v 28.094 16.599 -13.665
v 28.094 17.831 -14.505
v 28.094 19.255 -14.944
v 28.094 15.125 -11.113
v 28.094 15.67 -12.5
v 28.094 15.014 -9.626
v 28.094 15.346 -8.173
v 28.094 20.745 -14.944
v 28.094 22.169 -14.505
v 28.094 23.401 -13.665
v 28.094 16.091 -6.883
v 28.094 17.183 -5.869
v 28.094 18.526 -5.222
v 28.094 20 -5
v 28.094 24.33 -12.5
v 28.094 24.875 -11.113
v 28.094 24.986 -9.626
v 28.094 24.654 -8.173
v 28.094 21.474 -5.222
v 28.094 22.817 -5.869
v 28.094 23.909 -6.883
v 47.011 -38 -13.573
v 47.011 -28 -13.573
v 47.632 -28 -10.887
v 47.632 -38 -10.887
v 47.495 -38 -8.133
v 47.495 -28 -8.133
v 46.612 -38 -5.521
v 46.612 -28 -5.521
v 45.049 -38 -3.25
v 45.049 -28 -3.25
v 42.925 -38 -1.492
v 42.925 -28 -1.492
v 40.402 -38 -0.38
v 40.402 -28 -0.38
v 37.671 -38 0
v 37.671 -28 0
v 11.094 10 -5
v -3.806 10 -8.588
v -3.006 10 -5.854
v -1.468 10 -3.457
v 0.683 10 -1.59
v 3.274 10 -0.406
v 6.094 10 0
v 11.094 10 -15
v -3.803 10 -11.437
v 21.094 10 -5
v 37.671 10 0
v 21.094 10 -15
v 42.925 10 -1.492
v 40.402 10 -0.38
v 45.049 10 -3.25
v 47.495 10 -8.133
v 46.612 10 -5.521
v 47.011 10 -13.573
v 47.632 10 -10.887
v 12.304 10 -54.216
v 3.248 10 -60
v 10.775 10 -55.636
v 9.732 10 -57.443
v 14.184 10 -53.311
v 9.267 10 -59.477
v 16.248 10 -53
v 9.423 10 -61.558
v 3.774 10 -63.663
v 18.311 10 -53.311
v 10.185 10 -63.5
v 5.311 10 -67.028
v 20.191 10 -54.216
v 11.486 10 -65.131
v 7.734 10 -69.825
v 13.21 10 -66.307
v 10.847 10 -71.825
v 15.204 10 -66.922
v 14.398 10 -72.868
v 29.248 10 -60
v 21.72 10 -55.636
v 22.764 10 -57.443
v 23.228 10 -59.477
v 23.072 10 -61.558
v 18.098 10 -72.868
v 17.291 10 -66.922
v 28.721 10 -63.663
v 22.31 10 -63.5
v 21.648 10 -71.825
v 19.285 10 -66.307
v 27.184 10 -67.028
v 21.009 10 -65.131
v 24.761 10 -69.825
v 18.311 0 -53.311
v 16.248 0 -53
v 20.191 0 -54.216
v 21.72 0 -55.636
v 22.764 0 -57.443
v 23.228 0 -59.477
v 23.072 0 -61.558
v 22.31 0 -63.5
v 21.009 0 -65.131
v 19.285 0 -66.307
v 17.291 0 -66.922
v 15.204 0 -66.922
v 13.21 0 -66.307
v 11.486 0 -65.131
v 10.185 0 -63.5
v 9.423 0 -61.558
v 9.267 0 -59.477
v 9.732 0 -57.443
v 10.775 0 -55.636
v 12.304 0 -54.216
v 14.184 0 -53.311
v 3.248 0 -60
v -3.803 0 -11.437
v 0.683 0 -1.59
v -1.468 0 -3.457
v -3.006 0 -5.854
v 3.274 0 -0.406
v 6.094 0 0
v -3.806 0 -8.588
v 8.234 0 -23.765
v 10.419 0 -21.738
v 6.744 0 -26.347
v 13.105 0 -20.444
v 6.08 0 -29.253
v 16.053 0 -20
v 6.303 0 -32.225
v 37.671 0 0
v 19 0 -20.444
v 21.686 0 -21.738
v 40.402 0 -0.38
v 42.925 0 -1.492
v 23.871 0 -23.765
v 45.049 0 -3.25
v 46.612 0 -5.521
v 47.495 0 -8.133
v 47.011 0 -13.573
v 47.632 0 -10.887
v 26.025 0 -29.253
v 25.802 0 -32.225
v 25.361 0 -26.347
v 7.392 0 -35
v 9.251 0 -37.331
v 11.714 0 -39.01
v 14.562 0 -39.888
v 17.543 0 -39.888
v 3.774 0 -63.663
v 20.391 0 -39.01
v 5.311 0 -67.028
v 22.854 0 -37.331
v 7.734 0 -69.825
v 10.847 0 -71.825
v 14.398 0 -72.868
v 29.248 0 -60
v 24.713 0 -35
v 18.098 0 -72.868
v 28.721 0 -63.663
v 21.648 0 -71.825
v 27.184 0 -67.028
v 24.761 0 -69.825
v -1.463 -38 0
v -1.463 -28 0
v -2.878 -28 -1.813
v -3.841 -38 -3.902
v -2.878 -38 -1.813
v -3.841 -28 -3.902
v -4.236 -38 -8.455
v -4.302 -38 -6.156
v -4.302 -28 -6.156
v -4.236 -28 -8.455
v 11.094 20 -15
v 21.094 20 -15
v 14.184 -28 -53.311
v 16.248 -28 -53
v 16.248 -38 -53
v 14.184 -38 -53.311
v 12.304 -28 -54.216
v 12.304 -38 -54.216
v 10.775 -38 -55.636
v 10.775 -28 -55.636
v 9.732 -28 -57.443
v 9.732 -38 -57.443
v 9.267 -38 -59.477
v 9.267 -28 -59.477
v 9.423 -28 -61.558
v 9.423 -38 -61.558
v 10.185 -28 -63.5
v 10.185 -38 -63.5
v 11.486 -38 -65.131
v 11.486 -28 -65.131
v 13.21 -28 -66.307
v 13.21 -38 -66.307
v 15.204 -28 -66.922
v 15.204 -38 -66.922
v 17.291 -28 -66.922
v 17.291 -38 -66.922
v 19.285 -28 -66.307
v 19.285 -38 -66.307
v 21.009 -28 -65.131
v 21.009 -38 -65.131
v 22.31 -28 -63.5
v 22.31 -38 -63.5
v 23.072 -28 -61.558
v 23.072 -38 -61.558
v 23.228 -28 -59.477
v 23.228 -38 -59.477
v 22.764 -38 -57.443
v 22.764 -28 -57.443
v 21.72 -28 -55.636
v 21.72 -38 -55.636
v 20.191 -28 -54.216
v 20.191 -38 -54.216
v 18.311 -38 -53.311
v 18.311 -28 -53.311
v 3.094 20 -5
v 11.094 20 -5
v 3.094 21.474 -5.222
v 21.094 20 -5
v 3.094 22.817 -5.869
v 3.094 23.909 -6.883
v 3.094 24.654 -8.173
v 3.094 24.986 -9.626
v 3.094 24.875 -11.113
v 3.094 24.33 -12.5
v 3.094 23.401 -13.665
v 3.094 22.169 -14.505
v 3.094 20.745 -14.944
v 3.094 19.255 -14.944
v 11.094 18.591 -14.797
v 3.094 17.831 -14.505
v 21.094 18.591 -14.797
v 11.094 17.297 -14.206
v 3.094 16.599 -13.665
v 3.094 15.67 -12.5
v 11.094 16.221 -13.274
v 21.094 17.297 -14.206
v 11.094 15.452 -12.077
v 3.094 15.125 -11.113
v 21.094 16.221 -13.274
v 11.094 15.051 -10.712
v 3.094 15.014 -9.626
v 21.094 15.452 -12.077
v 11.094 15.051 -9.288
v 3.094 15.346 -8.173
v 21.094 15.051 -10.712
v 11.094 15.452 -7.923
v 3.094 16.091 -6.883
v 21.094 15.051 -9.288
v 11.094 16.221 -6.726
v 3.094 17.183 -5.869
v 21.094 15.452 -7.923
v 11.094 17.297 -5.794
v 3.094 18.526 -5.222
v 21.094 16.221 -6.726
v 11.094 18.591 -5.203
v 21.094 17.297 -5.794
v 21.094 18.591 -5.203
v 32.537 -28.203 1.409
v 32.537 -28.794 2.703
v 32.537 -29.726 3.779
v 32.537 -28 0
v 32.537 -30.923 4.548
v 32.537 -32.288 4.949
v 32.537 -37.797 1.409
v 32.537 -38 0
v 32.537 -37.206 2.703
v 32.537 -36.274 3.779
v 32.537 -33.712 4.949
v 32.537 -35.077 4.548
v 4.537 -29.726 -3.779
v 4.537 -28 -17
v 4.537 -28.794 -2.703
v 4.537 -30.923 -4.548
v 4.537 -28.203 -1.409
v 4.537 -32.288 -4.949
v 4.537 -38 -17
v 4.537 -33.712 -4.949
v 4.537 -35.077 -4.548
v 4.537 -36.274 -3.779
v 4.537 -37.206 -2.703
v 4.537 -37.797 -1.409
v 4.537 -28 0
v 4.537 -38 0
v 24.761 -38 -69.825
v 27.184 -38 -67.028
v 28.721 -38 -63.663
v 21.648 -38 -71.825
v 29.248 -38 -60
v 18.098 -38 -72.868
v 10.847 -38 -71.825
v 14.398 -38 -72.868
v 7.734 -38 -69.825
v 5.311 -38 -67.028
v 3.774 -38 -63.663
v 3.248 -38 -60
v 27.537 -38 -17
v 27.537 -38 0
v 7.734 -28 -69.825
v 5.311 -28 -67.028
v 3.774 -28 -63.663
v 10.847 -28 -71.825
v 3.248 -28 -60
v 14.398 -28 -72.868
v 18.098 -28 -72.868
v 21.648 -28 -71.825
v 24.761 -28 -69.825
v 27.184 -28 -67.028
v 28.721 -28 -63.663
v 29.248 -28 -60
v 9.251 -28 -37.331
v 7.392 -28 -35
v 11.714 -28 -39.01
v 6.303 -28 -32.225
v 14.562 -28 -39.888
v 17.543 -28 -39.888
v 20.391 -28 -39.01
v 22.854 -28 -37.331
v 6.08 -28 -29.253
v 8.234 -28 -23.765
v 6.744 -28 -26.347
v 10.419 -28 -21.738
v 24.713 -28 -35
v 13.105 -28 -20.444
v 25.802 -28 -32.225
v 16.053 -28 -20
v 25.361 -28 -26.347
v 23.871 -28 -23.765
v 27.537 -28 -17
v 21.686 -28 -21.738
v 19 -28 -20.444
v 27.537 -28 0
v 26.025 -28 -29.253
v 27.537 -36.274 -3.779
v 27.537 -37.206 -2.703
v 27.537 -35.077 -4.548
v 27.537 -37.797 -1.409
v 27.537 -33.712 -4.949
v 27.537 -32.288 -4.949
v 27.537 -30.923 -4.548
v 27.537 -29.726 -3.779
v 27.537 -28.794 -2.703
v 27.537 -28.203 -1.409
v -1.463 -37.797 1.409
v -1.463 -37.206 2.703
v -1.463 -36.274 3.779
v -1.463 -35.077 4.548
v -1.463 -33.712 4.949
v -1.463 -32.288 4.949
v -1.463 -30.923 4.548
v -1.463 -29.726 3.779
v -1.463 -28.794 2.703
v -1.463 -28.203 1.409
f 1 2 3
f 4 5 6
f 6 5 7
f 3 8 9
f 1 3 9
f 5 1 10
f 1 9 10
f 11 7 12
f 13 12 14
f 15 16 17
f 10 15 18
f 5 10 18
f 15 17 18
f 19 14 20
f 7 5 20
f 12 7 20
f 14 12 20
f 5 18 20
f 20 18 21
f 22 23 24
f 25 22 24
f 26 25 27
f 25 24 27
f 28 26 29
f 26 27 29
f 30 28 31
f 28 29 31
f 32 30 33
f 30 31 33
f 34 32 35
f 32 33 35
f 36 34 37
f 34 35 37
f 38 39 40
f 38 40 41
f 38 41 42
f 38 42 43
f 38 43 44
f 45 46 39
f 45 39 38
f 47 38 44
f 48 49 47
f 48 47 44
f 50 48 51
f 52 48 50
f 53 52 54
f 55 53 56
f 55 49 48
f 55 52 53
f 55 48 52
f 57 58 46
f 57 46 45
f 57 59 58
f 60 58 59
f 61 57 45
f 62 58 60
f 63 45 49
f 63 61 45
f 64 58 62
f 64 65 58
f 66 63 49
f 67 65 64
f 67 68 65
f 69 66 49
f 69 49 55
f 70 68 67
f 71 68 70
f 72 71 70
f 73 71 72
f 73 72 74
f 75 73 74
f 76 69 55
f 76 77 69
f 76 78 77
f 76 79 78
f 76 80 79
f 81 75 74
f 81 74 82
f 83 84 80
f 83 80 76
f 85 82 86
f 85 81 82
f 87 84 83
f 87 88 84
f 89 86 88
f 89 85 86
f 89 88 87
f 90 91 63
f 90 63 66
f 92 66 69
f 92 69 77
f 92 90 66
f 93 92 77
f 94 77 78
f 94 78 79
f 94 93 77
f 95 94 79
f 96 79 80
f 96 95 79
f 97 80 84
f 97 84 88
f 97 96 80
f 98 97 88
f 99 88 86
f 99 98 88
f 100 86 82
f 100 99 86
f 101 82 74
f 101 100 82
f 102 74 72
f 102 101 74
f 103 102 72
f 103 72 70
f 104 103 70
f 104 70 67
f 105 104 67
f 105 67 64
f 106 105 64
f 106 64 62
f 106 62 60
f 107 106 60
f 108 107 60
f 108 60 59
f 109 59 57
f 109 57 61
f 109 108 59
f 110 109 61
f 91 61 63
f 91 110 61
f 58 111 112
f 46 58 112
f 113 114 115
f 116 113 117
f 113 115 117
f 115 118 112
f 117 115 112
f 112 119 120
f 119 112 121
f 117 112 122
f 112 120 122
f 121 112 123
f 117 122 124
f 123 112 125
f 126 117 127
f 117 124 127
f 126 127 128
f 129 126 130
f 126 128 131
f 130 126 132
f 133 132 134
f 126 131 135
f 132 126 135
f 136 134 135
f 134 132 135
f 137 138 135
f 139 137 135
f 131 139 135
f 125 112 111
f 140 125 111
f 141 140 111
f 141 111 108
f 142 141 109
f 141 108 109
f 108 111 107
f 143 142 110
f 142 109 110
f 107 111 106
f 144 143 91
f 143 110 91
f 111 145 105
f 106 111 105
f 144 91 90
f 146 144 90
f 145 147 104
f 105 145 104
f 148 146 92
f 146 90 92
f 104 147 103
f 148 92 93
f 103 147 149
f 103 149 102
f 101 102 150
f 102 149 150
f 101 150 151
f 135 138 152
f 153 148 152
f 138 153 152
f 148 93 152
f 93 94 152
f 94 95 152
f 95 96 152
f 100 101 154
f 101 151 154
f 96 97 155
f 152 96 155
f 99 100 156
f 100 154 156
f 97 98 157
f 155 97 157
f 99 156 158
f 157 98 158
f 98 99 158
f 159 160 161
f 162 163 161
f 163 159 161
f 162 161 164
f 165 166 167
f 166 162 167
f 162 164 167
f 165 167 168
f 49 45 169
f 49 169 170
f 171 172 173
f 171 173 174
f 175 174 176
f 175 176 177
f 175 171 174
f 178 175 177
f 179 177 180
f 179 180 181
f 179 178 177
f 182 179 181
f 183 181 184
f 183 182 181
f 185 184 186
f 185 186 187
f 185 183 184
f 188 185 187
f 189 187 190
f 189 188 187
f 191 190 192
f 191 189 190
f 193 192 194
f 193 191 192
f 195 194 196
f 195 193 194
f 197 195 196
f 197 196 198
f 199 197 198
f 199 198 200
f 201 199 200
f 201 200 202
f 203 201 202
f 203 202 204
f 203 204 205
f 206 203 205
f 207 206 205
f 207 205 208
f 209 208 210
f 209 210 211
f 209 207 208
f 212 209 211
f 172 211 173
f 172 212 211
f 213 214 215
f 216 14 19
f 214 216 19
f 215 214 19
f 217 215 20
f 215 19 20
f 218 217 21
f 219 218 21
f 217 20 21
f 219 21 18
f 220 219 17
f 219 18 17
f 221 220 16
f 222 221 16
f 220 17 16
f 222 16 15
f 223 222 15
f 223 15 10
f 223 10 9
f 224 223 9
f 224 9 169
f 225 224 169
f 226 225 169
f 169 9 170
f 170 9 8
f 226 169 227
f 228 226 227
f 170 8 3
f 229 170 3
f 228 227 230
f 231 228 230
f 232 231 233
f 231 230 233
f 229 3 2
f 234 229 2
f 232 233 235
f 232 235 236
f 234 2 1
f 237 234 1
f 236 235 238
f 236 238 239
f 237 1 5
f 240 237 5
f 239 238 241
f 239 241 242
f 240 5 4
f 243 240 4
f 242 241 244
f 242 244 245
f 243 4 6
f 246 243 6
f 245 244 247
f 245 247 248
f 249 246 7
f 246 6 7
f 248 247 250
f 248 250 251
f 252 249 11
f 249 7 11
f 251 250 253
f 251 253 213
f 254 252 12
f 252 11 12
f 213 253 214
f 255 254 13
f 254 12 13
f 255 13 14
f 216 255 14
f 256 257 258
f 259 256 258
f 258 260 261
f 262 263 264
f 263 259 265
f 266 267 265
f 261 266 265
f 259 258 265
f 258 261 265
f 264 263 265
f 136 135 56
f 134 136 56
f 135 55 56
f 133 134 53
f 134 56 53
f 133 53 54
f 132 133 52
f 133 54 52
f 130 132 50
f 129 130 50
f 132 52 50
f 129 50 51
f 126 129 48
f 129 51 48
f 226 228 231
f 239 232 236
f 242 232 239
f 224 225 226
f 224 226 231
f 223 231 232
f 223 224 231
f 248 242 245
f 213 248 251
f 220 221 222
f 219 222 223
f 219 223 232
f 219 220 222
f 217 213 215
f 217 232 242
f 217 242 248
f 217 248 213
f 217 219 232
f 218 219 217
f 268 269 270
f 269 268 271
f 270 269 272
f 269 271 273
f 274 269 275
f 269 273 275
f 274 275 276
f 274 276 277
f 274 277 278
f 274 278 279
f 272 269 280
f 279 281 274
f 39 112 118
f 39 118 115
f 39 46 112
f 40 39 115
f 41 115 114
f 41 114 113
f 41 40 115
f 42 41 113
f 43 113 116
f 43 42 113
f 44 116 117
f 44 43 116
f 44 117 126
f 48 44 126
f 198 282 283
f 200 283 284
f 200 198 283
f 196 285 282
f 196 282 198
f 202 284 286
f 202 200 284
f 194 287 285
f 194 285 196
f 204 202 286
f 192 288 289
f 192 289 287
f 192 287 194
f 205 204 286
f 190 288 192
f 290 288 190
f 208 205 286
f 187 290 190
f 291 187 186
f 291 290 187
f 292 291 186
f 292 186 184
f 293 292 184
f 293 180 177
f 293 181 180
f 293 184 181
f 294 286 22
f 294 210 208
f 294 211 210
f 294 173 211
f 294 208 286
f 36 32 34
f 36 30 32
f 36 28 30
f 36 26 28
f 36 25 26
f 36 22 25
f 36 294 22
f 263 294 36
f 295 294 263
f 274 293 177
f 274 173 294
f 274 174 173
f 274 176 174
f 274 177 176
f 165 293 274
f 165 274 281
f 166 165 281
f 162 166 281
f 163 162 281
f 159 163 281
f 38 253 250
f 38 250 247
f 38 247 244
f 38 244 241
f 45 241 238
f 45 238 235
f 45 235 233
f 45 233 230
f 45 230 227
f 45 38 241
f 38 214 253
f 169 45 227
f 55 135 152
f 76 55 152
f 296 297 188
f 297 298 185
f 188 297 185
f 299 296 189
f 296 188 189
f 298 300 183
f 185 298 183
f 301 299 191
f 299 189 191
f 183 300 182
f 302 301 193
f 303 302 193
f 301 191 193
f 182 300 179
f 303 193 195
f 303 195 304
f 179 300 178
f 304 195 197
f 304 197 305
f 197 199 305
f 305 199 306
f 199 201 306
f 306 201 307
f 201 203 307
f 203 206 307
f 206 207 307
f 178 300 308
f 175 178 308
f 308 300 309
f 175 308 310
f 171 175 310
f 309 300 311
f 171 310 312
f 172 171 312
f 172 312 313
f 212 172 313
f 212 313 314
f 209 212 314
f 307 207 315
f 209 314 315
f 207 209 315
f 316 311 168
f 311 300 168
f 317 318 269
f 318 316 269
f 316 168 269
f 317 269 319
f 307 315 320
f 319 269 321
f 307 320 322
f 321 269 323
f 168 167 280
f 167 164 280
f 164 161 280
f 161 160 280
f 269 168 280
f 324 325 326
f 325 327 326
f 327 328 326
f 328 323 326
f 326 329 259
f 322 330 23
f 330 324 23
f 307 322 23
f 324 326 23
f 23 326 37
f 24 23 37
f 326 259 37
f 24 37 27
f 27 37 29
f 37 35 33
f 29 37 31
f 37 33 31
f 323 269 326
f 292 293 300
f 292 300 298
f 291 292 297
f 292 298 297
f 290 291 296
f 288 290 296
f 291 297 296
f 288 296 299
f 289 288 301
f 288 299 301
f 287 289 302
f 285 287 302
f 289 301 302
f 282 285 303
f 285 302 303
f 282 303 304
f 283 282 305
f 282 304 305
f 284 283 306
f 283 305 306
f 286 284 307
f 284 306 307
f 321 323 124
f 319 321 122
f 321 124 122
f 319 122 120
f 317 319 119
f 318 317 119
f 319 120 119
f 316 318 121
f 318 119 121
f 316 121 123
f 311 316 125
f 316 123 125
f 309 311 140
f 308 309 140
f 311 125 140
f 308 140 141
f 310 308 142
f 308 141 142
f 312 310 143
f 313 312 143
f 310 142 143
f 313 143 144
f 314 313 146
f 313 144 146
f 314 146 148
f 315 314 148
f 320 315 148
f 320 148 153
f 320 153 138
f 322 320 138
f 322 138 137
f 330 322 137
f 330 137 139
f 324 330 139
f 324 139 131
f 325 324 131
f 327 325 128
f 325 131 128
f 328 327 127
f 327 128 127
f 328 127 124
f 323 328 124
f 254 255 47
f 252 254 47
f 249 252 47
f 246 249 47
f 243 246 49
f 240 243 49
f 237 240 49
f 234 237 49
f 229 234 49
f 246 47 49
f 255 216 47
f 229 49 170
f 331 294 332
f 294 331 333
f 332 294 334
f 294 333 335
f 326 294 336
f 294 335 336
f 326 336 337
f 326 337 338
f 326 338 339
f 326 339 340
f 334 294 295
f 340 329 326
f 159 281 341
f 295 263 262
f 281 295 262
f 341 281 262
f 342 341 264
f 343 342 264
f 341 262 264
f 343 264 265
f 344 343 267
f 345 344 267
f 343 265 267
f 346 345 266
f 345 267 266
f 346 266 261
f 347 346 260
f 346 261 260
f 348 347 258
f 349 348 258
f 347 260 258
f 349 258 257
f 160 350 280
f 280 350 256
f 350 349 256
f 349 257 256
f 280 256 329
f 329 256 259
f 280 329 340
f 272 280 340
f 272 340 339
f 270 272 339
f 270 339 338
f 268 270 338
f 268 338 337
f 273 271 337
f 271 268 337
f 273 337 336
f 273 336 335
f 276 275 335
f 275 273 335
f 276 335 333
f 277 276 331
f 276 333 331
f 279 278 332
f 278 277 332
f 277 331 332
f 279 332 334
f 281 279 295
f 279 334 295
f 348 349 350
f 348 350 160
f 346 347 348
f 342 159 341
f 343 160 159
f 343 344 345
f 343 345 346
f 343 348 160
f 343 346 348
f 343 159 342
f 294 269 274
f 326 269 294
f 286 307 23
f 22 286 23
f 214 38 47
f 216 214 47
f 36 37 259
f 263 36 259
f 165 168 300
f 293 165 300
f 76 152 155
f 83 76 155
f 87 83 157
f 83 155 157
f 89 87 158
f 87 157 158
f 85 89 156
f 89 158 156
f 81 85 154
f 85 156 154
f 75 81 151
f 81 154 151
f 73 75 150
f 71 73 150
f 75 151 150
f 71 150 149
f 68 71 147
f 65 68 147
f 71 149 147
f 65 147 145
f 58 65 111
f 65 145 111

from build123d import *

# Parameters (mm, degrees)
SKETCH1_R                = 13
SKETCH1_R_2              = 7
BOSS_EXTRUDE2_DEPTH      = 10
SKETCH2_R                = 10
BOSS_EXTRUDE3_DEPTH      = 28
SKETCH3_R                = 10
SKETCH3_R_2              = 13
SKETCH3_R_3              = 7
BOSS_EXTRUDE4_DEPTH      = 10
FILLET2_R                = 10
CUT_EXTRUDE1_DEPTH       = 17
BOSS_EXTRUDE5_DEPTH      = 29
BOSS_EXTRUDE5_DEPTH_BACK = 5
SKETCH5_R                = 5
FILLET3_R                = 10
SKETCH6_R                = 10
BOSS_EXTRUDE6_DEPTH      = 10
SKETCH7_W                = 10
SKETCH7_H                = 10
BOSS_EXTRUDE7_DEPTH      = 10
BOSS_EXTRUDE8_DEPTH      = 8
BOSS_EXTRUDE8_DEPTH_BACK = 17
SKETCH8_R                = 5


with BuildPart() as part:
    # Sketch1 → Boss-Extrude2 (new body)
    # profile 1 of 2: a face of its own
    with BuildSketch(Plane(origin=(0, 0, 0), x_dir=(1, 0, 0), z_dir=(0, 1, 0))):
        with BuildLine():
            ThreePointArc((29.247640438, 60), (16.247640438, 47), (3.247640438, 60))
            Line((3.247640438, 60), (-5.462946679, 0))
            Line((-5.462946679, 0), (52.203983694, 0))
            Line((52.203983694, 0), (29.247640438, 60))
        make_face()
    # profile 2 of 2: a face of its own
    with BuildSketch(Plane(origin=(0, 0, 0), x_dir=(1, 0, 0), z_dir=(0, 1, 0))):
        with Locations((16.247640438, 60)):
            Circle(SKETCH1_R)
        with Locations(Location((16.247640438, 60, 0), (0, 0, 270))):
            Circle(SKETCH1_R_2, mode=Mode.SUBTRACT)
    extrude(amount=BOSS_EXTRUDE2_DEPTH)

    # Sketch2 → Boss-Extrude3 (add)
    with BuildSketch(Plane.XZ):
        with Locations(Location((16.05250876, -30, 0), (0, 0, 90))):
            Circle(SKETCH2_R)
    extrude(amount=BOSS_EXTRUDE3_DEPTH)

    # Fillet2
    fillet2_edges = [part.edges().sort_by_distance(p)[0] for p in [
        (52.203983694, 5, 0),
        (-5.462946679, 5, 0),
    ]]
    fillet(fillet2_edges, radius=FILLET2_R)



with BuildPart() as body_2:
    # Sketch3 → Boss-Extrude4 (new body)
    # profile 1 of 2: a face of its own
    with BuildSketch(Plane.XZ.offset(28)):
        with BuildLine():
            Line((-5.462946679, 0), (3.247640438, -60))
            ThreePointArc((3.247640438, -60), (16.247640438, -47), (29.247640438, -60))
            Line((29.247640438, -60), (52.203983694, 0))
            Line((52.203983694, 0), (-5.462946679, 0))
        make_face()
        with Locations(Location((16.05250876, -30, 0), (0, 0, 90))):
            Circle(SKETCH3_R, mode=Mode.SUBTRACT)
    # profile 2 of 2: a face of its own
    with BuildSketch(Plane.XZ.offset(28)):
        with Locations((16.247640438, -60)):
            Circle(SKETCH3_R_2)
        with Locations(Location((16.247640438, -60, 0), (0, 0, 90))):
            Circle(SKETCH3_R_3, mode=Mode.SUBTRACT)
    extrude(amount=BOSS_EXTRUDE4_DEPTH)

    # Sketch4 → Cut-Extrude1 (cut)
    with BuildSketch(Plane.XY):
        Polygon((4.537053321, -33), (4.537053321, -38), (27.537053321, -38), (27.537053321, -28), (4.537053321, -28), align=None)
    extrude(amount=-CUT_EXTRUDE1_DEPTH, mode=Mode.SUBTRACT)

    # Sketch5 → Boss-Extrude5 (add, two sides: drawn at the far end of the back side and taken through both)
    with BuildSketch(Plane.ZY.offset(-27.537053321).offset(-BOSS_EXTRUDE5_DEPTH_BACK)):
        with Locations(Location((0, -33, 0), (0, 0, 270))):
            Circle(SKETCH5_R)
    extrude(amount=BOSS_EXTRUDE5_DEPTH + BOSS_EXTRUDE5_DEPTH_BACK)

    # Fillet3
    # the kernel refuses this fillet: 10 mm, written as the material it takes off along each edge
    with BuildSketch(Plane(origin=(-5.462946679, -6.641526704, 0), x_dir=(0.14367033386913813, 0, -0.989625603531927), z_dir=(0, -1, 0))) as fillet3_piece_1:
        with BuildLine():
            CenterArc((8.543389319, 10), FILLET3_R, 217.167683939, 52.832316061)
            Line((0.574681335, 3.958502414), (0.415307176, 3.837672462))
            ThreePointArc((0.415307176, 3.837672462), (0.089415547, 2.007985274), (-0.197925121, 0.028734067))
            Line((-0.197925121, 0.028734067), (0, -0.2))
            Line((0, -0.2), (8.543389319, -0.2))
            Line((8.543389319, -0.2), (8.543389319, 0))
        make_face()
    extrude(amount=52.716946593, mode=Mode.SUBTRACT)
    with BuildSketch(Plane(origin=(52.203983694, 8.33251049, 0), x_dir=(-0.35734343452809125, 0, -0.9339730562493052), z_dir=(0, -1, 0))) as fillet3_piece_2:
        with BuildLine():
            CenterArc((FILLET3_R * 1.45330041958, -FILLET3_R), FILLET3_R, 90, 110.9371366)
            Line((FILLET3_R * 0.519327363336, -FILLET3_R * 1.35734343453), (FILLET3_R * 0.500647902211, -FILLET3_R * 1.36449030322))
            Line((FILLET3_R * 0.500647902211, -FILLET3_R * 1.36449030322), (-FILLET3_R * 0.0290660083917, FILLET3_R * 0.02))
            Line((-FILLET3_R * 0.0290660083917, FILLET3_R * 0.02), (FILLET3_R * 1.45330041958, FILLET3_R * 0.02))
            Line((FILLET3_R * 1.45330041958, FILLET3_R * 0.02), (FILLET3_R * 1.45330041958, 0))
        make_face()
    extrude(amount=82.665020979, mode=Mode.SUBTRACT)


with BuildPart() as part_1:
    add(part.part)

    add(body_2.part)  # Boss-Extrude6 merges body 2
    # Sketch6 → Boss-Extrude6 (add)
    with BuildSketch(Plane.XZ.offset(28)):
        with Locations(Location((16.05250876, -30, 0), (0, 0, 90))):
            Circle(SKETCH6_R)
    extrude(amount=BOSS_EXTRUDE6_DEPTH)

    # Sketch7 → Boss-Extrude7 (add)
    with BuildSketch(Plane(origin=(0, 10, 0), x_dir=(1, 0, 0), z_dir=(0, 1, 0))):
        with Locations((16.093649369, 10)):
            Rectangle(SKETCH7_W, SKETCH7_H)
    extrude(amount=BOSS_EXTRUDE7_DEPTH)

    # Sketch8 → Boss-Extrude8 (add, two sides: drawn at the far end of the back side and taken through both)
    with BuildSketch(Plane.ZY.offset(-11.093649369).offset(-BOSS_EXTRUDE8_DEPTH_BACK)):
        with Locations((-10, 20)):
            Circle(SKETCH8_R)
    extrude(amount=BOSS_EXTRUDE8_DEPTH + BOSS_EXTRUDE8_DEPTH_BACK)


solid = part_1.part
